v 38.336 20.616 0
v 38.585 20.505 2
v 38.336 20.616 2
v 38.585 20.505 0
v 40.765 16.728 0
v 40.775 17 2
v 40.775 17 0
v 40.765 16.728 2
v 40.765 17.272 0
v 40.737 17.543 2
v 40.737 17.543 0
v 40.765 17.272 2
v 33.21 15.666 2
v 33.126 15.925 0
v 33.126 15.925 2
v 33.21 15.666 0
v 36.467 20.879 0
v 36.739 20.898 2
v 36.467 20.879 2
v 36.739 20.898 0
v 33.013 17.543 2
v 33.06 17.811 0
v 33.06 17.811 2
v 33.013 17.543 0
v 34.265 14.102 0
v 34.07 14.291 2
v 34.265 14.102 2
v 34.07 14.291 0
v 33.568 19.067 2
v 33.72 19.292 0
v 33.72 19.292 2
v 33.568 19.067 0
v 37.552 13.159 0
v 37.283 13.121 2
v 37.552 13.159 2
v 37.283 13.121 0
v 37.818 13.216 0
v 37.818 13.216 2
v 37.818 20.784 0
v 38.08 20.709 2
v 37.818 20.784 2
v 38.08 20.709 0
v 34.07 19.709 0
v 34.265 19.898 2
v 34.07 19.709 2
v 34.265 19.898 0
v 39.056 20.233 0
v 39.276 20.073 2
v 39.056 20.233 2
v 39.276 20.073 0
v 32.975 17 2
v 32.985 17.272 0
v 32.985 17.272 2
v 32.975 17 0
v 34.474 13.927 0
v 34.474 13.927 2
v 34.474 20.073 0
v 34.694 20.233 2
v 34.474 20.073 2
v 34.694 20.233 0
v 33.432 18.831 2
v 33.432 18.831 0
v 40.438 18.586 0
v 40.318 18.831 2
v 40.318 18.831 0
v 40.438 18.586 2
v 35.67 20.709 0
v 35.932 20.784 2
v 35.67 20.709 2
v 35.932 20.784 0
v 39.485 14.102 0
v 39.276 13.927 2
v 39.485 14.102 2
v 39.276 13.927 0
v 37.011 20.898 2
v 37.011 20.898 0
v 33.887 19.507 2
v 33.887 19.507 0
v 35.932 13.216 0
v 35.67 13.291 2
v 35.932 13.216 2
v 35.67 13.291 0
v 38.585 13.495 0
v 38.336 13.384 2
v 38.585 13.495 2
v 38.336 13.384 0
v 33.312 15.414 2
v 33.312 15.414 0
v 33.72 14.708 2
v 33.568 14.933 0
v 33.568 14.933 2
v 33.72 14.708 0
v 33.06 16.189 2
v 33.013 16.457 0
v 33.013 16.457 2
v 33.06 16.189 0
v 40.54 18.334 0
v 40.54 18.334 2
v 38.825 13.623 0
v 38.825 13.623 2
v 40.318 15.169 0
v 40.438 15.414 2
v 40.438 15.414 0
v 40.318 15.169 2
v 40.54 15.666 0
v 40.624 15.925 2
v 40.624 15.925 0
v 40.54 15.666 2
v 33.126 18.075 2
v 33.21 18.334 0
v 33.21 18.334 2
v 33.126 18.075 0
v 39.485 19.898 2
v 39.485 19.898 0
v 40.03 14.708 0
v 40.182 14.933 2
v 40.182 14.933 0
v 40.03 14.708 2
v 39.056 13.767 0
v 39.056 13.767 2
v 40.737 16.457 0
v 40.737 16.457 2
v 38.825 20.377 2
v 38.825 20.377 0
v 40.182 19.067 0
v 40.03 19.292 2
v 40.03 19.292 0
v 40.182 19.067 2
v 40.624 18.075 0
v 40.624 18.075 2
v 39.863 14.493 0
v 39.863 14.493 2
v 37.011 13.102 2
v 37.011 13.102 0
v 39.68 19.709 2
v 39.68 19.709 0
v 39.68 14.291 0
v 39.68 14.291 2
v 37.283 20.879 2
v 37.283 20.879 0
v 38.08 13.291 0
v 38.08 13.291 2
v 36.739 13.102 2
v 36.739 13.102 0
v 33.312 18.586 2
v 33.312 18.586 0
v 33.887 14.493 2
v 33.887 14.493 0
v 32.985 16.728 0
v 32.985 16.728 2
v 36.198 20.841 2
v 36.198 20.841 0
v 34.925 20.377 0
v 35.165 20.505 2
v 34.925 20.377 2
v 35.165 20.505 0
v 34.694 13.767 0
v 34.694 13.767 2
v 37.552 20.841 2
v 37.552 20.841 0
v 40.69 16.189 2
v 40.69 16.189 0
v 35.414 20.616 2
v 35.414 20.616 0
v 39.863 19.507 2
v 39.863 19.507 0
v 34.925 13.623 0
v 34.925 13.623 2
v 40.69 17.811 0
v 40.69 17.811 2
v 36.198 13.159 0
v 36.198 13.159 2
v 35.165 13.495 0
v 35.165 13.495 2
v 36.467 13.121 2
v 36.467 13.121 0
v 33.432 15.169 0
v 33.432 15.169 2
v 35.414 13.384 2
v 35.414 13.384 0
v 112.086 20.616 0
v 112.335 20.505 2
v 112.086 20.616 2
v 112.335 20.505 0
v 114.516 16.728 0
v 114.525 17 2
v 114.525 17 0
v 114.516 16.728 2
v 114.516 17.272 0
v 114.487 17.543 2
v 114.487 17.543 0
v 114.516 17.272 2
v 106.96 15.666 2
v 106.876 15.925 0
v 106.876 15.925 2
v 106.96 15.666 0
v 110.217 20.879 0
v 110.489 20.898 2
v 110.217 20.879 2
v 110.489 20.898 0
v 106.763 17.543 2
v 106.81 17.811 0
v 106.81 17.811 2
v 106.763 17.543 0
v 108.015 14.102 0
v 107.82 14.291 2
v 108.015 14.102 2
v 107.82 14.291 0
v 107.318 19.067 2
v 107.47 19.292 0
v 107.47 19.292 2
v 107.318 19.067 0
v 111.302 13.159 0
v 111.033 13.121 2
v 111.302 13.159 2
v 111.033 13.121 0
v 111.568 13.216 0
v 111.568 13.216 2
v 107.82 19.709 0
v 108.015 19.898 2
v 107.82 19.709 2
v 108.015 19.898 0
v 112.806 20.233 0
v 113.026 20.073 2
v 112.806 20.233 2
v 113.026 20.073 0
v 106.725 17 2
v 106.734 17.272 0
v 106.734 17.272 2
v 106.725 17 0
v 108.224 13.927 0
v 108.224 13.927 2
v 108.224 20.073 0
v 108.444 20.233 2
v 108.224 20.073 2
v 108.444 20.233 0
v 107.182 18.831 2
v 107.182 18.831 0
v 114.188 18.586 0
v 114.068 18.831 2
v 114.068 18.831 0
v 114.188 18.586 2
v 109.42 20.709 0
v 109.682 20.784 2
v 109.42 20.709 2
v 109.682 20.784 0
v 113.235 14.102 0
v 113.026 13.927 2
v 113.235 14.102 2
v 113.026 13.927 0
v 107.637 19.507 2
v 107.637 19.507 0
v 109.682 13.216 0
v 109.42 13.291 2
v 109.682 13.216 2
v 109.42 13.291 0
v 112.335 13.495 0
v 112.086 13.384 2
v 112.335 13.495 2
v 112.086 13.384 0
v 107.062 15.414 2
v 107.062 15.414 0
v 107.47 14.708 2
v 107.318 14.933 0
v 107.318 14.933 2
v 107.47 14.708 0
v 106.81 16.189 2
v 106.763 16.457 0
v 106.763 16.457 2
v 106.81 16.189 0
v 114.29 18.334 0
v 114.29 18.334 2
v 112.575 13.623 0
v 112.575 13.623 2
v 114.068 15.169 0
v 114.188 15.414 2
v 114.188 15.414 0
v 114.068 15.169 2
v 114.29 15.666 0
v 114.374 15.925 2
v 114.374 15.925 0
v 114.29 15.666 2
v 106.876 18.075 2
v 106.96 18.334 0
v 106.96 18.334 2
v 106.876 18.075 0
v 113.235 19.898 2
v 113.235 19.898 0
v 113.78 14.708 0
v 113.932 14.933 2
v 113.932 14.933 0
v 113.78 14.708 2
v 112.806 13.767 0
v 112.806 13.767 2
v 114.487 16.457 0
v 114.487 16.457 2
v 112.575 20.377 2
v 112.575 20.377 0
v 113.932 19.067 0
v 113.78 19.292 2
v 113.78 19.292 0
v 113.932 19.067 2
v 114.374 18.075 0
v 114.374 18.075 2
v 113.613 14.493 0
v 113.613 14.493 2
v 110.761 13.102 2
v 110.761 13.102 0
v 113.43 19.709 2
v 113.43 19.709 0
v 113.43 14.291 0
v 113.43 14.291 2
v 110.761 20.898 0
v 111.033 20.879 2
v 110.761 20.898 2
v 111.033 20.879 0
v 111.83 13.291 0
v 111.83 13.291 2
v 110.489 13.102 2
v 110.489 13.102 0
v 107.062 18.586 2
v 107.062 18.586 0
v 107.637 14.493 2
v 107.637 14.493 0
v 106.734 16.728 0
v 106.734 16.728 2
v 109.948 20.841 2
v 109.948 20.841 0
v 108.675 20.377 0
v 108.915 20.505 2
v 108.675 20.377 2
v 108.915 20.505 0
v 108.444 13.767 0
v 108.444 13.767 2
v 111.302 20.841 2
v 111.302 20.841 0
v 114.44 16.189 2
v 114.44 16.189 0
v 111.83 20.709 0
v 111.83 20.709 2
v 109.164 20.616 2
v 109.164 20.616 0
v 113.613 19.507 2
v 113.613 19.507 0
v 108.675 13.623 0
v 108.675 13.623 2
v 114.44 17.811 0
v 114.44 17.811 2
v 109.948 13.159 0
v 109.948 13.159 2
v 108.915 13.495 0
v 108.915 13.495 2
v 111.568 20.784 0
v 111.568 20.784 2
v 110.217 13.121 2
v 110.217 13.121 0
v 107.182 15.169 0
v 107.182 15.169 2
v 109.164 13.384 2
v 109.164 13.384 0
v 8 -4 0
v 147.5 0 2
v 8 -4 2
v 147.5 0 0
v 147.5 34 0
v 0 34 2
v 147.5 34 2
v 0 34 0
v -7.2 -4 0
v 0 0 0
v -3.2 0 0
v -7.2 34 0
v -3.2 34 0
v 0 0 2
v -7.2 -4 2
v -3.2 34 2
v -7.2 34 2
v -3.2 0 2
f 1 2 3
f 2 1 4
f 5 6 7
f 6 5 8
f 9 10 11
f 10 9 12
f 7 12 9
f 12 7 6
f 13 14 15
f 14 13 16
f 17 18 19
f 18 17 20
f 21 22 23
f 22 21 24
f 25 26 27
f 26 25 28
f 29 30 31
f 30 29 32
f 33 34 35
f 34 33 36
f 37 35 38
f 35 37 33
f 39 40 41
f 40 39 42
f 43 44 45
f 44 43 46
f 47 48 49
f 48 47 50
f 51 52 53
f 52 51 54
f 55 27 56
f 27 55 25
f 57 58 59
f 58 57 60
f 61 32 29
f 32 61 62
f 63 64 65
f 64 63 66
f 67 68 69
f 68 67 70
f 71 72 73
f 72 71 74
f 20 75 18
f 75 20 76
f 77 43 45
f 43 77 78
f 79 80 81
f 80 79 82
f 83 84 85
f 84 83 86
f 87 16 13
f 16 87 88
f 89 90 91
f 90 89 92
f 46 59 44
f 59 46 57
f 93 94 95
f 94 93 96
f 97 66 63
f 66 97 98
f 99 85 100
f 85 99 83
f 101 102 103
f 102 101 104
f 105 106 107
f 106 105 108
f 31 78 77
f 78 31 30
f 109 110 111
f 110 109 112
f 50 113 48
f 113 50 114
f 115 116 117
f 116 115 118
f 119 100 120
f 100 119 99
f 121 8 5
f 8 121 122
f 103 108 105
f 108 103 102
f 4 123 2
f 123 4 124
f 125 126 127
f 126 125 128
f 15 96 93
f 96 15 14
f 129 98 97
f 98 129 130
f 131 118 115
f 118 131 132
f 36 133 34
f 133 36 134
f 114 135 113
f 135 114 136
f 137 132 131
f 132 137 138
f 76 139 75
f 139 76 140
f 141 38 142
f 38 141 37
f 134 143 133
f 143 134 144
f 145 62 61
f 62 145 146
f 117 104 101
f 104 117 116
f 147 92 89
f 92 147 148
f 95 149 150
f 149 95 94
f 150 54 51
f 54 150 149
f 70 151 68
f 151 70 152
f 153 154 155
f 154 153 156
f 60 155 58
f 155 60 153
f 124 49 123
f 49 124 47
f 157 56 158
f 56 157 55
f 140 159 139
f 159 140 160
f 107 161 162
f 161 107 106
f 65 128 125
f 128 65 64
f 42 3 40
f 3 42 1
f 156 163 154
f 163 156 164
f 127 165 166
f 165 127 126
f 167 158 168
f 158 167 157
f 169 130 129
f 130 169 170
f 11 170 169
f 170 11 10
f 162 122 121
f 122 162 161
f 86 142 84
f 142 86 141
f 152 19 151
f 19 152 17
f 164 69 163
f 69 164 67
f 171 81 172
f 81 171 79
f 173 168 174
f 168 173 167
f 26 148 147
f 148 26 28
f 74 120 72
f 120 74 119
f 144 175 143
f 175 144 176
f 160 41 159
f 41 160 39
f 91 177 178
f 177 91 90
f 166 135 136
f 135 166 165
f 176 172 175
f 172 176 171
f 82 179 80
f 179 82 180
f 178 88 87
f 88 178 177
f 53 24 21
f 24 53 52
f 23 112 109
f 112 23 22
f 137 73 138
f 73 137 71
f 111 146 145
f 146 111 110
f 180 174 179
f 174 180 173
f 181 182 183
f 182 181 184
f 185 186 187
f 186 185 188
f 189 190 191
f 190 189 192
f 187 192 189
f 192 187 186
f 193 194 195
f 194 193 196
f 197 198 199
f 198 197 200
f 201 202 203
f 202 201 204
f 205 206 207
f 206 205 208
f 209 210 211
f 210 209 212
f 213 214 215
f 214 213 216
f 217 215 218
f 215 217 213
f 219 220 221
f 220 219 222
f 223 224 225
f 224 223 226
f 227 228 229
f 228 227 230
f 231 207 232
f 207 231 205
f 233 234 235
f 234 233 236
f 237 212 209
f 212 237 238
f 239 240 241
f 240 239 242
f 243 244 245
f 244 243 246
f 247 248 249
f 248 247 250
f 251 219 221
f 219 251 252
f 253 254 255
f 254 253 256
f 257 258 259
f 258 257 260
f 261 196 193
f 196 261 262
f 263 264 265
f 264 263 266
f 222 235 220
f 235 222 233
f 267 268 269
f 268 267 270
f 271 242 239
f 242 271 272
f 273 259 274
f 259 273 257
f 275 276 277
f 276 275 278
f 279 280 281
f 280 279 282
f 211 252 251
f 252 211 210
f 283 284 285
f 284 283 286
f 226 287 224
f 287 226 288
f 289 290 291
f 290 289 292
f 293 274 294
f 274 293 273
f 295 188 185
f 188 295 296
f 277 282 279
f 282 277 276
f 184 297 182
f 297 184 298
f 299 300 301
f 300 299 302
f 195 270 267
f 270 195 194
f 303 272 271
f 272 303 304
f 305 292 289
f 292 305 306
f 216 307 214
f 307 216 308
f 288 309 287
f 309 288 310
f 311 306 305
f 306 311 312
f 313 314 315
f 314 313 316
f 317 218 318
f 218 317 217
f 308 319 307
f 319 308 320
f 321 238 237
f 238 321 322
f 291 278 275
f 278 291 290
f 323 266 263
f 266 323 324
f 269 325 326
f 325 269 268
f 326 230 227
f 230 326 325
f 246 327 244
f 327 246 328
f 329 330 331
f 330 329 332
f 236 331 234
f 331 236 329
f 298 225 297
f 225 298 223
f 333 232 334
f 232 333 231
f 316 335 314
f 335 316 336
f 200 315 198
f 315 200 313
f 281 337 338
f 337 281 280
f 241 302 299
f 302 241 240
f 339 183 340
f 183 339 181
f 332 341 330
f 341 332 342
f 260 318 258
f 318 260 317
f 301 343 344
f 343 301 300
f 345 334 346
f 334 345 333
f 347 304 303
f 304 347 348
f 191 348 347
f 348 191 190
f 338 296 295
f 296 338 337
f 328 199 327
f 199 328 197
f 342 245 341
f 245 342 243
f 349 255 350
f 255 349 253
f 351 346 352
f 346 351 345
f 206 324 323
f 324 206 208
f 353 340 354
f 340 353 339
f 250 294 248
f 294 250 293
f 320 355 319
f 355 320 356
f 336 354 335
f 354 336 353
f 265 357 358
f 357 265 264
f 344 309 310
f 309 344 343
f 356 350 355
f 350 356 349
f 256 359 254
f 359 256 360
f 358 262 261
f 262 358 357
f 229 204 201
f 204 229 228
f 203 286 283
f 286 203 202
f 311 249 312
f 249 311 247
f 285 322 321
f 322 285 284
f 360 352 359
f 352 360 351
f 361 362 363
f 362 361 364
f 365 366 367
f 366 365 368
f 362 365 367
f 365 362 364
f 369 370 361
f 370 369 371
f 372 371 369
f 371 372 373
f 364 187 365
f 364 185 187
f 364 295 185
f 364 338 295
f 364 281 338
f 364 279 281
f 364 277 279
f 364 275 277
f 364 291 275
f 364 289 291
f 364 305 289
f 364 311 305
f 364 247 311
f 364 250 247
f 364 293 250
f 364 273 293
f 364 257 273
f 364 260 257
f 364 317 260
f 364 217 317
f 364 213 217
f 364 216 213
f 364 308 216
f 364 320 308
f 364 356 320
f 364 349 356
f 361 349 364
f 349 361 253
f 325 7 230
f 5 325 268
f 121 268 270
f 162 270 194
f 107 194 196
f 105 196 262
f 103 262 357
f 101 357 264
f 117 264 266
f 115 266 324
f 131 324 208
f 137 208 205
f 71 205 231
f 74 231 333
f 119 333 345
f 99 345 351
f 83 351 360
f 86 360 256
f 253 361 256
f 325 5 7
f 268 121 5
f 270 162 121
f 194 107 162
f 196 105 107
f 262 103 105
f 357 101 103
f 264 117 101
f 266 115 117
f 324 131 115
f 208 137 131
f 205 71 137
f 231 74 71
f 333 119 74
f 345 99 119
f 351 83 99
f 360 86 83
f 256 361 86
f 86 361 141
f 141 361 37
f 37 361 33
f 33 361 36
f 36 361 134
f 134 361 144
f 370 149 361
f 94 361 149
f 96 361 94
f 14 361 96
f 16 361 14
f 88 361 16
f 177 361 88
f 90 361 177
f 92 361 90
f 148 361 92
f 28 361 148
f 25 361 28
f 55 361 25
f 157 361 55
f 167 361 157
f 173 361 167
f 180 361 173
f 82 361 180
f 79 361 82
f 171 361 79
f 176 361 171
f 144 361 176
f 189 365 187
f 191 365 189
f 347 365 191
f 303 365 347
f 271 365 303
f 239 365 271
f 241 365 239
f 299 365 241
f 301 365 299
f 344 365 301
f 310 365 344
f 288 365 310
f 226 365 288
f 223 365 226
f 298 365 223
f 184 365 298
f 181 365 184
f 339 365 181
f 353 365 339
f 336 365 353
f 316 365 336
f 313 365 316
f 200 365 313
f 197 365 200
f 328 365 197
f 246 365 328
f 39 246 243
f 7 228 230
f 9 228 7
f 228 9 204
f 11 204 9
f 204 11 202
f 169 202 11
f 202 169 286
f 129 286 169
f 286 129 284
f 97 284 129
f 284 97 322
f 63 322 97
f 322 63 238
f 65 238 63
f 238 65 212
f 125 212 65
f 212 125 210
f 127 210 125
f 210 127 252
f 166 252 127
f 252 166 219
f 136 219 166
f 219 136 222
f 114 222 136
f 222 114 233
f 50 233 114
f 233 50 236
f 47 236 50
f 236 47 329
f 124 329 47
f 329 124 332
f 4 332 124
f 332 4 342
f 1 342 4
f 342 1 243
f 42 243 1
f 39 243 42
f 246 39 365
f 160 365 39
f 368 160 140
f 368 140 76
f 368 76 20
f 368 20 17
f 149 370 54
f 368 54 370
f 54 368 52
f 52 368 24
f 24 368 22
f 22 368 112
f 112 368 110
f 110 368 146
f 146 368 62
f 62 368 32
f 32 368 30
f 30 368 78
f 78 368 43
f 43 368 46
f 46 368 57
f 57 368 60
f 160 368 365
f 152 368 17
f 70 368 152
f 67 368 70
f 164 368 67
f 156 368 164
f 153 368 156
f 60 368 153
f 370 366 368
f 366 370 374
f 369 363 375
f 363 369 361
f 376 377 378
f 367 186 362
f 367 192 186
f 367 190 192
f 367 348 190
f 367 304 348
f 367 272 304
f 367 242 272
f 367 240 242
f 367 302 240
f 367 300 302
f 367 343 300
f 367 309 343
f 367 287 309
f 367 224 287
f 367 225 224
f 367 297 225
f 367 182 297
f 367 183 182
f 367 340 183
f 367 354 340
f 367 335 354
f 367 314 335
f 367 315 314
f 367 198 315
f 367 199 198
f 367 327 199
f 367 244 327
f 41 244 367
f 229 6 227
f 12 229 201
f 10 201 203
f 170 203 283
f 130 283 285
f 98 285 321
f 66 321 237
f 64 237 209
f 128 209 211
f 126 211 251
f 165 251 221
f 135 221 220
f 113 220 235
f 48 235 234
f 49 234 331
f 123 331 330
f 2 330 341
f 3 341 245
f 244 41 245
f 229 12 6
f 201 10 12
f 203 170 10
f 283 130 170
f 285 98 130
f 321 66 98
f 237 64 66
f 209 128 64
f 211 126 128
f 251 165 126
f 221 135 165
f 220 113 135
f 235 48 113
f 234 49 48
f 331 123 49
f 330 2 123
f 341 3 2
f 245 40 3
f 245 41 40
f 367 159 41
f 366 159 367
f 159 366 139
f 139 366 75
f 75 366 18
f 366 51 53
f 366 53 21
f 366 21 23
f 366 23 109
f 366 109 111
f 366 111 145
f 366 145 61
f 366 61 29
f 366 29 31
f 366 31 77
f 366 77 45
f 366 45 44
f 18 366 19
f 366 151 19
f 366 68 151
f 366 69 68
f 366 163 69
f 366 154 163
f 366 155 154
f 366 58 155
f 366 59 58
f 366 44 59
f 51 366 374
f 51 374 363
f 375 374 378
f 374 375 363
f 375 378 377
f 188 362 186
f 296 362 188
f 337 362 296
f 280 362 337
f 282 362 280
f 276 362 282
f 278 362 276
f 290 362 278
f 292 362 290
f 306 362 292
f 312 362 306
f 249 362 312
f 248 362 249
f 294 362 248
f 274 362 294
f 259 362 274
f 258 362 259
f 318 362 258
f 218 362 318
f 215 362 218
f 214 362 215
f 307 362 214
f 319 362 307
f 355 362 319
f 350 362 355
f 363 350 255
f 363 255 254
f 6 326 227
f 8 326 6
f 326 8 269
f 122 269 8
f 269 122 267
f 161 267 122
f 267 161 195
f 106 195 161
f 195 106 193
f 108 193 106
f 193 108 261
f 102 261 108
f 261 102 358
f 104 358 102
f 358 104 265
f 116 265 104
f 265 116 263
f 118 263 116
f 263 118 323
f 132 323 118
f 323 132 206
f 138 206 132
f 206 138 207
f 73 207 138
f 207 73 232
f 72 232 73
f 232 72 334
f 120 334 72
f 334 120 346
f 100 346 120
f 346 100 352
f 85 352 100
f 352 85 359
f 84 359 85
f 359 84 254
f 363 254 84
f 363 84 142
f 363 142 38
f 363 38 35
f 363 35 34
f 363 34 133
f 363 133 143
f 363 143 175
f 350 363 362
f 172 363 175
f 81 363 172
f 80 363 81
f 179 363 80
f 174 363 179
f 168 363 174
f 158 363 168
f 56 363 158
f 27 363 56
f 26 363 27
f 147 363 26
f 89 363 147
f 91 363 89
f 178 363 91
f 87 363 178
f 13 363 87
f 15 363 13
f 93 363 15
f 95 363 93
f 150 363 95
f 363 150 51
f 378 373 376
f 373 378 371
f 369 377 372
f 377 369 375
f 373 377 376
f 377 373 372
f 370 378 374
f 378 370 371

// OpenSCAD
$fn = 90;

STERLITE_FRONT_WIDTH = 295;
MODULE_WIDTH = STERLITE_FRONT_WIDTH / 2;
MODULE_HEIGHT = 34;
FILLAMENT_HOLE_DIAMETER = 7.8;
NOTCH_WIDTH = 3.20;
 
%cube([STERLITE_FRONT_WIDTH, MODULE_HEIGHT, 2]);
difference() {
    hull() {
        cube([MODULE_WIDTH, MODULE_HEIGHT, 2]);
        translate([0, -4, 0])
        cube([8, 4, 2]);
    }
    interface_width = STERLITE_FRONT_WIDTH*1;
    interface_offset = interface_width/4 - interface_width/8 + (STERLITE_FRONT_WIDTH - interface_width)/2;

    for (i = [0:3]) {
        translate([i*interface_width/4 + interface_offset, MODULE_HEIGHT/2, 1])
        cylinder(h=4, d=FILLAMENT_HOLE_DIAMETER, center=true);
    }
}

translate([-4 - NOTCH_WIDTH, 0, 0])
cube([4, MODULE_HEIGHT, 2]);

translate([-4 - NOTCH_WIDTH, -4, 0])
cube([4 + NOTCH_WIDTH, 4, 2]);
